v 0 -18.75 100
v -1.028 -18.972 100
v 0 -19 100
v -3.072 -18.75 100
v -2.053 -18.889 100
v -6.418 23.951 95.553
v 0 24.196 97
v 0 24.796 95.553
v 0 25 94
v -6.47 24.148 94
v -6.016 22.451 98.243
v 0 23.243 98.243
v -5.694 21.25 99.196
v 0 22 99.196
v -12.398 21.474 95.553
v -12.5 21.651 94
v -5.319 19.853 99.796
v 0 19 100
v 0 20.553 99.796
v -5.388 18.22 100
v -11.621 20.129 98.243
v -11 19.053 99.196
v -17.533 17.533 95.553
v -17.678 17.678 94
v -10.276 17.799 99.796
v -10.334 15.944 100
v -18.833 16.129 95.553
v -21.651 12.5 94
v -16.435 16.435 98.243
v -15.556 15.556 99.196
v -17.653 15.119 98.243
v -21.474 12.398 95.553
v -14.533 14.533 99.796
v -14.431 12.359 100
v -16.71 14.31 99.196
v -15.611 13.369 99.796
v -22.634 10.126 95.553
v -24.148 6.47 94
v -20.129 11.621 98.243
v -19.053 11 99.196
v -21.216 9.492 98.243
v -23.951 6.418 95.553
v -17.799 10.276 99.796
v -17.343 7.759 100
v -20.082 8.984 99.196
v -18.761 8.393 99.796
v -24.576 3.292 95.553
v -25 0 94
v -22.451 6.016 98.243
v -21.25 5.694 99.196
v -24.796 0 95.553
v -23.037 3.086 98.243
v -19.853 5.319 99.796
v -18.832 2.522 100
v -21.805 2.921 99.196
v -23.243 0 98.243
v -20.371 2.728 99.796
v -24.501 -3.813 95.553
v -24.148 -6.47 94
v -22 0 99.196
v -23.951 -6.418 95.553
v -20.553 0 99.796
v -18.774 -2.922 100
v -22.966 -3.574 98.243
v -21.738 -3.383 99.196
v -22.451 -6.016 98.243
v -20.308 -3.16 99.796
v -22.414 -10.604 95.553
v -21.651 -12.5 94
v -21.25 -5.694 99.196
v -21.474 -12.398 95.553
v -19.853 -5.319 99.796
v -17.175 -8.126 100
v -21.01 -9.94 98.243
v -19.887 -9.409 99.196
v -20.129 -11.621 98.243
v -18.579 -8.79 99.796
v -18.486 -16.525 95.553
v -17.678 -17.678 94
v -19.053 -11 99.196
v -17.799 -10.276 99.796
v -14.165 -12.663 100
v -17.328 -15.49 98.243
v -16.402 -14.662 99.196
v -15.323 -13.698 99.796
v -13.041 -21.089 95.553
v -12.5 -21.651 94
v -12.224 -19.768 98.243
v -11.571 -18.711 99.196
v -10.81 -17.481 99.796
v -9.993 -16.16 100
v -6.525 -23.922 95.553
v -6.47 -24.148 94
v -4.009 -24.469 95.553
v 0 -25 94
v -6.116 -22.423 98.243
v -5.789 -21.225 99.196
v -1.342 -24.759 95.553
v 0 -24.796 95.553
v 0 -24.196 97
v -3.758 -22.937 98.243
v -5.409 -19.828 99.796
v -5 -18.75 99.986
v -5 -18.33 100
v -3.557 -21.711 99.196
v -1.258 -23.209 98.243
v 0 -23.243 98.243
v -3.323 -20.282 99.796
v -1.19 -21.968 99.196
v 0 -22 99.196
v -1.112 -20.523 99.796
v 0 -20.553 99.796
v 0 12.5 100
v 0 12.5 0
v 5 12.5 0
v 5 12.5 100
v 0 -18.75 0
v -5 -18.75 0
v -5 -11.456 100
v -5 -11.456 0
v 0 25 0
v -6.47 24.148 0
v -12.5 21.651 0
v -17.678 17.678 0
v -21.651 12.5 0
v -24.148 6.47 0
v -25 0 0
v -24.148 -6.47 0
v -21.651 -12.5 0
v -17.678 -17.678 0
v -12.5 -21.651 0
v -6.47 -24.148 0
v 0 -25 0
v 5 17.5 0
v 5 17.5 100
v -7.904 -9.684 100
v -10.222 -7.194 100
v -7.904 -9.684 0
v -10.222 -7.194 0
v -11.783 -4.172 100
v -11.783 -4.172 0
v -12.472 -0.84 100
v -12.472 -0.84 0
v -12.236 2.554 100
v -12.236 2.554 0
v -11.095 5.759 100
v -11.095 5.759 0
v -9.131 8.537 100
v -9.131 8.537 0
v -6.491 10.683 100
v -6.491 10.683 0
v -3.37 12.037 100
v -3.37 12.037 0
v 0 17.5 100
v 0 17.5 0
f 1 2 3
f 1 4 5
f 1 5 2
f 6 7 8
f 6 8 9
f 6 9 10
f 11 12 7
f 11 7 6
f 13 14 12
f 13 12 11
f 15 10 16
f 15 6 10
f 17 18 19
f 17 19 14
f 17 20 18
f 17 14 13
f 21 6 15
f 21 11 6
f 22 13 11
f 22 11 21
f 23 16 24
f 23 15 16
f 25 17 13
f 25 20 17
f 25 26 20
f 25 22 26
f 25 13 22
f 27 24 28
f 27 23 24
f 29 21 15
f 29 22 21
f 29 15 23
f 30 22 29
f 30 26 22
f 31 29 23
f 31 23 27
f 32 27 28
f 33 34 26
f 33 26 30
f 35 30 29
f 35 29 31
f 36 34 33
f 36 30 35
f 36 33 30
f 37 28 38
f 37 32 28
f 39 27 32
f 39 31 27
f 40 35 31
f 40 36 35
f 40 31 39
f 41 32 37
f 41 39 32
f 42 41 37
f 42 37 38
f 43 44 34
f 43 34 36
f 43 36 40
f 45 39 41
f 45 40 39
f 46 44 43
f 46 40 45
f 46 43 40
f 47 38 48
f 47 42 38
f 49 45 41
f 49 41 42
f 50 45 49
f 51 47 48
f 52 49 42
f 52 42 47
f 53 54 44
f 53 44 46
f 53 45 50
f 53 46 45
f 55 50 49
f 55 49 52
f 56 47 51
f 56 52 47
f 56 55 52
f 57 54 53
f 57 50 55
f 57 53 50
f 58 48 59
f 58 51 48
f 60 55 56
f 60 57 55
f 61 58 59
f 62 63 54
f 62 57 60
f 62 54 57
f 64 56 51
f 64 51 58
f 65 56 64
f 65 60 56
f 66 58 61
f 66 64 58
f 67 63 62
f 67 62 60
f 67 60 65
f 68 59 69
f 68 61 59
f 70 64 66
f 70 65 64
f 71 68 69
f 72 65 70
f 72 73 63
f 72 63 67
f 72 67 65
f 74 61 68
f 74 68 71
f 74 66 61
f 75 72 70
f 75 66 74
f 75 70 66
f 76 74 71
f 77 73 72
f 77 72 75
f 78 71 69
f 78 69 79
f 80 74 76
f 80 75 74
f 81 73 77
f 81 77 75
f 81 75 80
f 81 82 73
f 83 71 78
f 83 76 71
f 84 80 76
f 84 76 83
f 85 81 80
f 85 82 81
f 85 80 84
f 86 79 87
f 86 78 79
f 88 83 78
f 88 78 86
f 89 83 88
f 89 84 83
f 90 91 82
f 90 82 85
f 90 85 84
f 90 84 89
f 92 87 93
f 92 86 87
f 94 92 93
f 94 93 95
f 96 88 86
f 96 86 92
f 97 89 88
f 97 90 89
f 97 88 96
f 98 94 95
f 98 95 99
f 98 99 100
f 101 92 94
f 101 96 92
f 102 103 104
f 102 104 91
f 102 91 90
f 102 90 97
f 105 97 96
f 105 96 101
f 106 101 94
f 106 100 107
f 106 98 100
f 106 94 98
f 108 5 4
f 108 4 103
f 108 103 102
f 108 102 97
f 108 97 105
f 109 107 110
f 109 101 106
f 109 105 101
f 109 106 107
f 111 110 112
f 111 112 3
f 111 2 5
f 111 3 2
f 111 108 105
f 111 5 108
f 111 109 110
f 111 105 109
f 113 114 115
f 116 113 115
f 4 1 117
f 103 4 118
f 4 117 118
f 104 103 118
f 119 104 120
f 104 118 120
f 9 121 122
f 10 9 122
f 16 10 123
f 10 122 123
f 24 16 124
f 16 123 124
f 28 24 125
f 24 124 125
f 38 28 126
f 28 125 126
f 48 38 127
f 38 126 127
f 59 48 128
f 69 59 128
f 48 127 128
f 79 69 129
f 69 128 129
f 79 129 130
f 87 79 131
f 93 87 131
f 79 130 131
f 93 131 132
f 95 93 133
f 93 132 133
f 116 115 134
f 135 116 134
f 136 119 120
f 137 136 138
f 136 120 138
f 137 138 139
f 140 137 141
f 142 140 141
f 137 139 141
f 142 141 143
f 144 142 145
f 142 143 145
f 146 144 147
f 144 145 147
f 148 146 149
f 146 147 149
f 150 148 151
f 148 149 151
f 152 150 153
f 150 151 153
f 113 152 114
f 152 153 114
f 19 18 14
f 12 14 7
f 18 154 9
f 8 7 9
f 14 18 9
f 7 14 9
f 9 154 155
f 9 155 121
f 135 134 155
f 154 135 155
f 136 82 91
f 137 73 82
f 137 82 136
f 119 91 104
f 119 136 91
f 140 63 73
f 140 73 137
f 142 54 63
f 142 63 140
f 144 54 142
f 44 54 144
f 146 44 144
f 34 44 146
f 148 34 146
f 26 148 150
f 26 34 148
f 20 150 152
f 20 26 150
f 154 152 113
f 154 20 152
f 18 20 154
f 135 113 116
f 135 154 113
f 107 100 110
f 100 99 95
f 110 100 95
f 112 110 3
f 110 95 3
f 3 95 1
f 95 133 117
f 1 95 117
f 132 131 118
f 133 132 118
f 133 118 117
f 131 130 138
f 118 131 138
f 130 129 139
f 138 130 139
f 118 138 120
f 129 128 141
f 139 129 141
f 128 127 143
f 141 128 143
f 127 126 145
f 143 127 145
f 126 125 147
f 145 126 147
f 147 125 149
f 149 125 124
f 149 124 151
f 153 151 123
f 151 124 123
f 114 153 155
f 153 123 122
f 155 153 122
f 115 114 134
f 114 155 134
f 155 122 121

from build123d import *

# Parameters (mm, degrees)
F1_DEPTH    = 100
F2_T2_ANGLE = 248.8655063523


# Not quite as in the source:
# - a fillet or chamfer that OpenCascade refuses, or shapes differently, is made with other operations: its cross-section is extruded or revolved along the edge and cut away or added


with BuildPart() as f1:
    # F0 (on Top) → F1 (new body)
    with BuildSketch(Plane.XY):
        with BuildLine():
            ThreePointArc((-5, -11.4564392374), (-12.2363289116, 2.5538705461), (0, 12.5))
            Line((0, 12.5), (5, 12.5))
            Line((5, 12.5), (5, 17.5))
            Line((5, 17.5), (0, 17.5))
            Line((0, 17.5), (0, 25))
            ThreePointArc((0, 25), (-25, 0), (0, -25))
            Line((0, -25), (0, -18.75))
            Line((0, -18.75), (-5, -18.75))
            Line((-5, -18.75), (-5, -11.4564392374))
        make_face()
    extrude(amount=F1_DEPTH)

    # F2: fillet of radius 6 on 1 edges, made by hand

    # F2_s1 → F2_t2 (revolve, cut)
    with BuildSketch(Plane(origin=(0, 0, 0), x_dir=(0, 0, 1), z_dir=(0.8247903997, -0.5654385878, 0))):
        with BuildLine():
            ThreePointArc((94, -25), (98.2426406871, -23.2426406871), (100, -19))
            Line((100, -19), (100, -25))
            Line((100, -25), (94, -25))
        make_face()
    revolve(axis=Axis((0, 0, 100), (0, 0, 1)), revolution_arc=F2_T2_ANGLE, mode=Mode.SUBTRACT)


solid = f1.part
